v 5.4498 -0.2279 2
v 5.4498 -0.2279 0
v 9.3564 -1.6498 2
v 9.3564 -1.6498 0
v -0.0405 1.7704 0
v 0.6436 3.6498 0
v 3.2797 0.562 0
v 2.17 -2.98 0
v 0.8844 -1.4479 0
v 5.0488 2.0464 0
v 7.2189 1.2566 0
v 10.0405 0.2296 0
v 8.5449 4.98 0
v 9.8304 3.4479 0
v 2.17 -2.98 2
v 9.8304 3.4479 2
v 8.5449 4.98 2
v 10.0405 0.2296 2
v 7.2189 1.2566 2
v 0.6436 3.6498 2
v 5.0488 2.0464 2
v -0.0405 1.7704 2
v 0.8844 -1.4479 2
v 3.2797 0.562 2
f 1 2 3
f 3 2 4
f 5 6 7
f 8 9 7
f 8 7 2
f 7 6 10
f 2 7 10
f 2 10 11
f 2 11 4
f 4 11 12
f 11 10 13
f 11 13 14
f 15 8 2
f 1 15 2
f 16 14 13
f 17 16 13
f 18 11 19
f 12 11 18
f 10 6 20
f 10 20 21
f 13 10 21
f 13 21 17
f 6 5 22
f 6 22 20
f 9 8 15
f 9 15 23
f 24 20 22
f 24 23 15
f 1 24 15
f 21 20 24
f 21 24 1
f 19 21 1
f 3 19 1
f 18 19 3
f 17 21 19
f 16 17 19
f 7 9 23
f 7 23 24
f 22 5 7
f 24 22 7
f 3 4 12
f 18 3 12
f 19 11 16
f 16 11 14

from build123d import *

# Parameters (mm, degrees)
BOX001_W               = 10
BOX001_H               = 2
BOX001_DEPTH           = 2
BOX001_PLACEMENT_ANGLE = 340
BOX_W                  = 10
BOX_H                  = 2
BOX_DEPTH              = 2
BOX_PLACEMENT_ANGLE    = 40


with BuildPart() as cube001:
    # Box001 → Box001 (new body)
    with BuildSketch(Plane.XY):
        with Locations((5, 1)):
            Rectangle(BOX001_W, BOX001_H)
    extrude(amount=BOX001_DEPTH)


with BuildPart() as cube001_1:
    # Box001 placement: moved
    add(cube001.part.moved(Location((-0.040483, 1.770408, 0))).rotate(Axis((-0.040483, 1.770408, 0), (0, 0, 1)), BOX001_PLACEMENT_ANGLE))


with BuildPart() as fusion:
    # Box → Box (new body)
    with BuildSketch(Plane.XY):
        with Locations((5, 1)):
            Rectangle(BOX_W, BOX_H)
    extrude(amount=BOX_DEPTH)


with BuildPart() as fusion_1:
    # Box placement: moved
    add(fusion.part.moved(Location((2.17, -2.98, 0))).rotate(Axis((2.17, -2.98, 0), (0, 0, 1)), BOX_PLACEMENT_ANGLE))

    # Fusion: union Cube001
    add(cube001_1.part)


solid = fusion_1.part
